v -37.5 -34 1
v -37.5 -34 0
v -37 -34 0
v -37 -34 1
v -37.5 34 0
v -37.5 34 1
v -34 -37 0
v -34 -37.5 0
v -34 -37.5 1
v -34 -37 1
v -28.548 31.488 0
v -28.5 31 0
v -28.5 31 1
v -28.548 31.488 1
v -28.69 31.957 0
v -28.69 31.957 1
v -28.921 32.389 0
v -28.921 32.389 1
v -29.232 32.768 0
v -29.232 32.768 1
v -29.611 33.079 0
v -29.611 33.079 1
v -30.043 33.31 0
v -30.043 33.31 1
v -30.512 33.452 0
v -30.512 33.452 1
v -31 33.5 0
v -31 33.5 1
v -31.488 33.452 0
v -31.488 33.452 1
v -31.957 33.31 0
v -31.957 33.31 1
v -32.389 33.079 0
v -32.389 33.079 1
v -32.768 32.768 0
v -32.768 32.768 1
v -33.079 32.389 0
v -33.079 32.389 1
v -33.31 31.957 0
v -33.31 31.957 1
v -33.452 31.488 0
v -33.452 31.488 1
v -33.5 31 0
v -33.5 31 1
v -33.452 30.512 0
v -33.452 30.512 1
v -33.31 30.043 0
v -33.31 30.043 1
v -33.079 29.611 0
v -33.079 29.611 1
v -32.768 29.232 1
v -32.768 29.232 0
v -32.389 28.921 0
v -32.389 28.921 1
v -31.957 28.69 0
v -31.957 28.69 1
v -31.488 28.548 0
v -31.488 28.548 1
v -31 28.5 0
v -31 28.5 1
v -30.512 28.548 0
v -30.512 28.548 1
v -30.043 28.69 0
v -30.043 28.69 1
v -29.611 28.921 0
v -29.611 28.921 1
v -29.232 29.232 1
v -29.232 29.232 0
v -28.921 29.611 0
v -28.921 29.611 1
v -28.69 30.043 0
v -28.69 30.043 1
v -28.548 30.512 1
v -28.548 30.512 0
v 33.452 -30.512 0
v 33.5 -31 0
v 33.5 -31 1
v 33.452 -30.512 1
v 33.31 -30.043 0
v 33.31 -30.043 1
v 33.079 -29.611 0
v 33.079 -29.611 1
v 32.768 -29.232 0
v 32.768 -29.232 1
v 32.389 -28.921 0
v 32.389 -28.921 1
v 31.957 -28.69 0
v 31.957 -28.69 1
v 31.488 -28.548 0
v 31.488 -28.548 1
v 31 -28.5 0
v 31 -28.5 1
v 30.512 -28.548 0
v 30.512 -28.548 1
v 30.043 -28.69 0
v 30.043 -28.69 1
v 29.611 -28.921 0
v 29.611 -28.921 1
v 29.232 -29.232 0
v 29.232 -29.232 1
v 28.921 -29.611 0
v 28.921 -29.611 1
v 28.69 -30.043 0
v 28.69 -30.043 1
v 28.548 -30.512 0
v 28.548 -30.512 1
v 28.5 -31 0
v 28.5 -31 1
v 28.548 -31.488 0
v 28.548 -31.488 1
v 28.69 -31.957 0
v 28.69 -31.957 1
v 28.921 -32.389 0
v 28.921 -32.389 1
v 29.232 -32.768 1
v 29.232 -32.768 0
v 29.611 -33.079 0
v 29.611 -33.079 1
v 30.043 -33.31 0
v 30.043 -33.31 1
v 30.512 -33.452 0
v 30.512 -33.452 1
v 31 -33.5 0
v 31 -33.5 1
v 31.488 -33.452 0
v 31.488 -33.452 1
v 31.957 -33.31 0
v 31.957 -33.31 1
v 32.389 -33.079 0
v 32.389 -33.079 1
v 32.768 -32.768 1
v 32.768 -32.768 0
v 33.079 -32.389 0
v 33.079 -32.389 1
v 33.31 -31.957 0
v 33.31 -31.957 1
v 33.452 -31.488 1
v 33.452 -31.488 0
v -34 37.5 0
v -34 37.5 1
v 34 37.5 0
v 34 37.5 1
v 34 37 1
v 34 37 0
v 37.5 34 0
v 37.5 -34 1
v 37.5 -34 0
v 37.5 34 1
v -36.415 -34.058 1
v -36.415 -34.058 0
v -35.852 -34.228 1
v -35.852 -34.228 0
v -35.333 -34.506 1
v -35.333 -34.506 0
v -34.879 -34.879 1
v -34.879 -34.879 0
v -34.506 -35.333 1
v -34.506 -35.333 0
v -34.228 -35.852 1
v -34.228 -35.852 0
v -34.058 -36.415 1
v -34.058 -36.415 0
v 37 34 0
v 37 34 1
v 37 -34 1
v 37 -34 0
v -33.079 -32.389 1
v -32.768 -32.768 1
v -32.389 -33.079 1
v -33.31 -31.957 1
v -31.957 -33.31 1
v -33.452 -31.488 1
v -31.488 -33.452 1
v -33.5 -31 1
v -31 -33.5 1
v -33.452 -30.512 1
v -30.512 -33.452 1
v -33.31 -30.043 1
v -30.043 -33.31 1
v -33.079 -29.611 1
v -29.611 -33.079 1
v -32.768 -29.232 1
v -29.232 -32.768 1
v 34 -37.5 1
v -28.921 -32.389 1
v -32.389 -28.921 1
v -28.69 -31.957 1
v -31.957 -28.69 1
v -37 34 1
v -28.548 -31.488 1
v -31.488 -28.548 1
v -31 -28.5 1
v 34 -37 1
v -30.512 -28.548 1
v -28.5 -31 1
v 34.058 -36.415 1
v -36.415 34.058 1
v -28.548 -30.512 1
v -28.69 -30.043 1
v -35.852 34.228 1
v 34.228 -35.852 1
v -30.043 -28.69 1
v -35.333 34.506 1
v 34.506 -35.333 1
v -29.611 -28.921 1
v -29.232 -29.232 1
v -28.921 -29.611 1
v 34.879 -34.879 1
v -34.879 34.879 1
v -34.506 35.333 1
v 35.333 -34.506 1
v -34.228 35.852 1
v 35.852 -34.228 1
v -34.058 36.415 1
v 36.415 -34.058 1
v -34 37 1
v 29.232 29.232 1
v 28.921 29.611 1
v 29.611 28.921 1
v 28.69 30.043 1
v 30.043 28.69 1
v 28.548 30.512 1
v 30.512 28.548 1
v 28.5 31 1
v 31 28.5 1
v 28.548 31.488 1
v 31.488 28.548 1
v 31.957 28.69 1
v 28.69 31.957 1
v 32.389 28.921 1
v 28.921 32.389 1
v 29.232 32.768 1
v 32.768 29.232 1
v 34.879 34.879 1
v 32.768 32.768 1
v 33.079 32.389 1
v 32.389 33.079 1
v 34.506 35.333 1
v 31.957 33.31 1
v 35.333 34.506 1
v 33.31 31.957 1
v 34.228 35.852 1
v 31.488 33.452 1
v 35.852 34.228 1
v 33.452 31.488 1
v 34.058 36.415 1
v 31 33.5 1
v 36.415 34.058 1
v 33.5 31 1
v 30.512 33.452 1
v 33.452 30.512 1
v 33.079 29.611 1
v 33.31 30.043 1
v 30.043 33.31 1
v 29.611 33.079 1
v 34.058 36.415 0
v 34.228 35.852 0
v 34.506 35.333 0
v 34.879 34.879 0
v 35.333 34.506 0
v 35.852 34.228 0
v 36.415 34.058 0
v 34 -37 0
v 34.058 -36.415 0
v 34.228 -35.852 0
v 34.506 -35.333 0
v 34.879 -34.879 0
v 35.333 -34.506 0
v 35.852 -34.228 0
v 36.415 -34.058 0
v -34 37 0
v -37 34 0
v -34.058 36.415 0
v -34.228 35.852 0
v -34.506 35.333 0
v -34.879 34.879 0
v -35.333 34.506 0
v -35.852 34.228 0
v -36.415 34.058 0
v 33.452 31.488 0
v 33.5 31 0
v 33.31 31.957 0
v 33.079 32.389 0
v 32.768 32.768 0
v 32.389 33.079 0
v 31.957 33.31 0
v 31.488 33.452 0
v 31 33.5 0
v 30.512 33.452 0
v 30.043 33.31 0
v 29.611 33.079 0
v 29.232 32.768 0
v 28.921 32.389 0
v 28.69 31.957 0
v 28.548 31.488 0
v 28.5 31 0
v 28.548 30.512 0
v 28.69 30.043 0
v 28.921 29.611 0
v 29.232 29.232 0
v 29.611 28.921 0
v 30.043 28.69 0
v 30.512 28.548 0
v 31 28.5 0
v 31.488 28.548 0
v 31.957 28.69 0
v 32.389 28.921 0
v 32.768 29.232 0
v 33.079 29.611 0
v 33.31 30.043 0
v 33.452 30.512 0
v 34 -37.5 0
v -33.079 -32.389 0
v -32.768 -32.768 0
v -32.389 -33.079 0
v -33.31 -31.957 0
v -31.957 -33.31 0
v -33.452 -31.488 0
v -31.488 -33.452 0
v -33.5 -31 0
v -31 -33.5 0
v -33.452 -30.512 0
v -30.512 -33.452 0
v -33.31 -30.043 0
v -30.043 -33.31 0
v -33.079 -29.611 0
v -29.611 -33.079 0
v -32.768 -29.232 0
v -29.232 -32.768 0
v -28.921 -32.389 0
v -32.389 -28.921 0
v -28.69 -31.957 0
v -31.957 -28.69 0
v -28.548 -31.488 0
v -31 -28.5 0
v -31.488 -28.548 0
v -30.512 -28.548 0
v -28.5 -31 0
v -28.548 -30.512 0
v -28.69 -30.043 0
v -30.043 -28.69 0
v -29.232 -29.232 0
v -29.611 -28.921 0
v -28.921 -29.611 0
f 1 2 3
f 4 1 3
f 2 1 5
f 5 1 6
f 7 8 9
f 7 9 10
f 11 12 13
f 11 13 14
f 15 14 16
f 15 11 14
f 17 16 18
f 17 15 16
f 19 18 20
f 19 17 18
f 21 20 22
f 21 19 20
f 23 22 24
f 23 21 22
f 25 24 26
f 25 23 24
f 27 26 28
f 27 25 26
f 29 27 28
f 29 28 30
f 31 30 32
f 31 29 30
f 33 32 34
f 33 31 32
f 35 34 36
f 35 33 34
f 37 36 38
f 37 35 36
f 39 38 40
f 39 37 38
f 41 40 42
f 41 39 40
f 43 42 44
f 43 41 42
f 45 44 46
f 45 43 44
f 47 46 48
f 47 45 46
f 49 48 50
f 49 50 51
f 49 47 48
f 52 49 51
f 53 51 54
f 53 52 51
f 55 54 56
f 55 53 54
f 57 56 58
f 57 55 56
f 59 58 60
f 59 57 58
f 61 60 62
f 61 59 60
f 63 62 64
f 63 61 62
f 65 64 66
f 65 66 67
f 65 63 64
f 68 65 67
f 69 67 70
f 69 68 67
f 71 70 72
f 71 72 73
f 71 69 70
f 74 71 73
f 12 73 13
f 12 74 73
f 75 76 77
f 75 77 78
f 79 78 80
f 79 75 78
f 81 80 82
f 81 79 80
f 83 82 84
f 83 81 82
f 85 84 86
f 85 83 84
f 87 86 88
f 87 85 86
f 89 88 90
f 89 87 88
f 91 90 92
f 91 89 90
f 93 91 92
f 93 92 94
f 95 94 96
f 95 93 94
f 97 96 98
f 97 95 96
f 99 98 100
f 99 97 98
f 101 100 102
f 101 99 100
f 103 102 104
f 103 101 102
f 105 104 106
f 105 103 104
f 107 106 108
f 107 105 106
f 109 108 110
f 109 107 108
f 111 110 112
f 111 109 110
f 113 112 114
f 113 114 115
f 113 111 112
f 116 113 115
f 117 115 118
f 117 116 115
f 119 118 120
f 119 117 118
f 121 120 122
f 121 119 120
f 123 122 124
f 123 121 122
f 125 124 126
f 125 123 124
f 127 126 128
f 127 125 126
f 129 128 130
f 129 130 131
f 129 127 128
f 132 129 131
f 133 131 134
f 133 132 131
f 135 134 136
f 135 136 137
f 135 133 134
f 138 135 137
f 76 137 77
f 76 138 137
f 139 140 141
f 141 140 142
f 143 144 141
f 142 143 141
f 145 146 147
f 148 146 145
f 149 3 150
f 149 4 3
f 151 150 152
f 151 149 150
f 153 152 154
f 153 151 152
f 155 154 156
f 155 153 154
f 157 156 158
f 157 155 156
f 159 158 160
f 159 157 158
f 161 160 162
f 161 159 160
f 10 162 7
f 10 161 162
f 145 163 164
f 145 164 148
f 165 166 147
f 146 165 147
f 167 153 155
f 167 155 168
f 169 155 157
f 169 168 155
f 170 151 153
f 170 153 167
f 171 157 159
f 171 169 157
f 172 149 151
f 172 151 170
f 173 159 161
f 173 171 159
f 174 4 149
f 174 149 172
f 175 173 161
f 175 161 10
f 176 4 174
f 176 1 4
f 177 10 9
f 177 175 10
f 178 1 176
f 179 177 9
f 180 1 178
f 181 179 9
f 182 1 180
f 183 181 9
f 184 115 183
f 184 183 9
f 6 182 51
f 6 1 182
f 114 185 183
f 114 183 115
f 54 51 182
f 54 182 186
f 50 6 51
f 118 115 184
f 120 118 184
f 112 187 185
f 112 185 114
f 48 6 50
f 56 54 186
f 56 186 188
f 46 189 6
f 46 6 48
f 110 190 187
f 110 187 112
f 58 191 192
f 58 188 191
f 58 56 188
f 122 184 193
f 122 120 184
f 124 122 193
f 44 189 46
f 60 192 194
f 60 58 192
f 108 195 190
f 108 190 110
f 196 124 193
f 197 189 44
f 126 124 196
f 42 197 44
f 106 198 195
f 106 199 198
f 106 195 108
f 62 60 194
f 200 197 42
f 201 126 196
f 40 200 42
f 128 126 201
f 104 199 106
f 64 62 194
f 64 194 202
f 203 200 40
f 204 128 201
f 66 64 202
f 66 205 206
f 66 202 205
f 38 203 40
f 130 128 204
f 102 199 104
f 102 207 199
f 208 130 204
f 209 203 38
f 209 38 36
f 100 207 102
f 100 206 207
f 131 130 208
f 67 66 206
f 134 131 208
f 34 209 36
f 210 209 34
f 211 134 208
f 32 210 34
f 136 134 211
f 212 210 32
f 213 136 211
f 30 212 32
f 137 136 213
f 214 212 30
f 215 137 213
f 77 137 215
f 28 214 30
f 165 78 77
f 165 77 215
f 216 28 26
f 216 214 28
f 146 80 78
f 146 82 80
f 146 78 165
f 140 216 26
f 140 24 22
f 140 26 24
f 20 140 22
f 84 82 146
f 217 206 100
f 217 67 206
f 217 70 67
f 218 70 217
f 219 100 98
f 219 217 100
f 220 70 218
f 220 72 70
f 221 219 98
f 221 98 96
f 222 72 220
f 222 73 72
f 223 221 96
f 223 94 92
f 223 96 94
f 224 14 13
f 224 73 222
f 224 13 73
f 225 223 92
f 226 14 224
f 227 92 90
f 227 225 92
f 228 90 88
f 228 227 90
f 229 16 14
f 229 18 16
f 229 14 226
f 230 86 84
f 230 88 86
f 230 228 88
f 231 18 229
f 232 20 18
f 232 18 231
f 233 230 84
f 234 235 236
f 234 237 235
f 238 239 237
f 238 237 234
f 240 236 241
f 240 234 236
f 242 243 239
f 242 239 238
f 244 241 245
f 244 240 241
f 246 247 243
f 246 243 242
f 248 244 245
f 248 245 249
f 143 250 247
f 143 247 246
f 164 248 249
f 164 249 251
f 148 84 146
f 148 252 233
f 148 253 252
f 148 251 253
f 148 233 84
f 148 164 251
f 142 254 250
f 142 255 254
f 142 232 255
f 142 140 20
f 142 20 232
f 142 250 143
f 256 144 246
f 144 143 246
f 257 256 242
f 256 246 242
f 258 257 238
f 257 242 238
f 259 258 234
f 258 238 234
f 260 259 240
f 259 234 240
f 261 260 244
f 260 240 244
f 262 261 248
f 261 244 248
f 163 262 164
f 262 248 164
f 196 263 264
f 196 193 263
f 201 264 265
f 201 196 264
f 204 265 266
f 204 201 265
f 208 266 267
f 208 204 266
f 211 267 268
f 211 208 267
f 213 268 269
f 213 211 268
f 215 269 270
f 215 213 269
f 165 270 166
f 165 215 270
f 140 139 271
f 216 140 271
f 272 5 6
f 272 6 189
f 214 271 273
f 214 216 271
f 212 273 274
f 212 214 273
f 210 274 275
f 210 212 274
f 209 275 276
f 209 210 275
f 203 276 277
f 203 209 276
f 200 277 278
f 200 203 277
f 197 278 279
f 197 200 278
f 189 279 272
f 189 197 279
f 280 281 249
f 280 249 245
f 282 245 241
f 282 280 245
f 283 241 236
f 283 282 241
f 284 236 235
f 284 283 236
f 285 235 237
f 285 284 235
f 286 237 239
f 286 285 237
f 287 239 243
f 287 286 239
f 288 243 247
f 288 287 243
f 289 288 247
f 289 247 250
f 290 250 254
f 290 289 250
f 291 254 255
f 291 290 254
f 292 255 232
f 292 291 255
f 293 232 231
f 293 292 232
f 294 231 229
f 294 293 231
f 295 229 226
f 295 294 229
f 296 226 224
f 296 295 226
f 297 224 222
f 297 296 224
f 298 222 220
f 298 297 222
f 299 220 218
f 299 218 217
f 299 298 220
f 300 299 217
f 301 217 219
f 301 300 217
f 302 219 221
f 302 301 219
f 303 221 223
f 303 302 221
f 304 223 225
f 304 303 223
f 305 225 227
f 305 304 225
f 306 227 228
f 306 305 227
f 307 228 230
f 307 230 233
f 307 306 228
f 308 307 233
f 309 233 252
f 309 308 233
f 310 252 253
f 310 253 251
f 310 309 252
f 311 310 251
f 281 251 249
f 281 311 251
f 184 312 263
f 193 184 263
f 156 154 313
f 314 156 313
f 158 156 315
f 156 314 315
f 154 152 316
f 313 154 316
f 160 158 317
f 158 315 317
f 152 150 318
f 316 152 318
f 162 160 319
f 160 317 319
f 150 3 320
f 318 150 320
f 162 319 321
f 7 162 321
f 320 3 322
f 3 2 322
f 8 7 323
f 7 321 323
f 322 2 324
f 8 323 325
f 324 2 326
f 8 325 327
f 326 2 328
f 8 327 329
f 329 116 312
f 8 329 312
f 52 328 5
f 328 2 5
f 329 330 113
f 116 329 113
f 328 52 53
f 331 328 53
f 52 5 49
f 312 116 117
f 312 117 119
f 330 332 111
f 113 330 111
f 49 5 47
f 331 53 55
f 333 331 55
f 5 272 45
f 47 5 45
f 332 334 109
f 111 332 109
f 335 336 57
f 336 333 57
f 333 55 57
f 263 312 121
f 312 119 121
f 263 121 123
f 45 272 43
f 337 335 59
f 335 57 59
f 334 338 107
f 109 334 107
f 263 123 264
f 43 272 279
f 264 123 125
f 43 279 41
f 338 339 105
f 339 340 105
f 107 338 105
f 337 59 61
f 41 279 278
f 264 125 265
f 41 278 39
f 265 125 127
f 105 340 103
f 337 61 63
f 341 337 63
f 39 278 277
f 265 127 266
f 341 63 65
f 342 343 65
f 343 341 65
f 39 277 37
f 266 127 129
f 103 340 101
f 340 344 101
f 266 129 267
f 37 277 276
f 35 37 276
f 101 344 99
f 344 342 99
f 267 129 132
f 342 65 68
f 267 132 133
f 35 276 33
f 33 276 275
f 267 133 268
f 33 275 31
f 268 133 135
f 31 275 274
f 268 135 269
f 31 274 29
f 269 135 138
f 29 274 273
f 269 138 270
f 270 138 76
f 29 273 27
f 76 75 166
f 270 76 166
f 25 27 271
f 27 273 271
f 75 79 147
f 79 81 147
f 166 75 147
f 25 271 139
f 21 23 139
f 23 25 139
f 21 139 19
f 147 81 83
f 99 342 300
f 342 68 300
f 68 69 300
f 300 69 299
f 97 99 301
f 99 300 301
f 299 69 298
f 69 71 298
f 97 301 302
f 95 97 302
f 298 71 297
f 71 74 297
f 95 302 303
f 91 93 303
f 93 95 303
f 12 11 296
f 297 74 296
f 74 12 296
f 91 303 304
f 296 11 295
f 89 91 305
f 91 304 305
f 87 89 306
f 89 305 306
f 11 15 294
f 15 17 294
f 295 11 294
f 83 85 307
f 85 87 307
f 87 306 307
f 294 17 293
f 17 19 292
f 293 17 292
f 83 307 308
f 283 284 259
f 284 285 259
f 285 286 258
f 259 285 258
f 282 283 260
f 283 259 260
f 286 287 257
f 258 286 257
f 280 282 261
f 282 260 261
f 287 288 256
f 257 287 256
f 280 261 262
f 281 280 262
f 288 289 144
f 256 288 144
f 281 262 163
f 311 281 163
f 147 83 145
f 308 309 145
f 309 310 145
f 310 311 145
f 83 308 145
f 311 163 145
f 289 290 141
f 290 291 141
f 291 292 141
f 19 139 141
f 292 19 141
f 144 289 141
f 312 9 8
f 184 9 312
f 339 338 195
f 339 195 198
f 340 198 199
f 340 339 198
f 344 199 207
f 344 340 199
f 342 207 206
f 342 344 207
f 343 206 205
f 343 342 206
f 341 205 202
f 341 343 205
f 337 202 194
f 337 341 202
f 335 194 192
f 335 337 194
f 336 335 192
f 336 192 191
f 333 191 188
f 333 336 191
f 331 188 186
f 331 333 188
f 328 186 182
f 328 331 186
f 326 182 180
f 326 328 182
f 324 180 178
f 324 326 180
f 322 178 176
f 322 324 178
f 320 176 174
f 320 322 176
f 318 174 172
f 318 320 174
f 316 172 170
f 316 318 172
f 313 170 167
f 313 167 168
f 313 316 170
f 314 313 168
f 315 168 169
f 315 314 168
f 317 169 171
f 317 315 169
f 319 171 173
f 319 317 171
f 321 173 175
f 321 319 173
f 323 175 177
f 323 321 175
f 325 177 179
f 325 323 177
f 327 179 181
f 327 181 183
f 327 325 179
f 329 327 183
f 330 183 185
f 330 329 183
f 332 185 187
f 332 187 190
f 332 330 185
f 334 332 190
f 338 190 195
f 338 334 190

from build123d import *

# Parameters (mm, degrees)
SKETCH_1_W          = 68
SKETCH_1_H          = 68
SKETCH_1_R          = 2.5
SKETCH_1_H_2        = 11
SKETCH_1_W_2        = 11
EXTRUDE_2_DEPTH     = 1
FILLET_1_R          = 3
SKETCH_2_W          = 7.5
SKETCH_2_H          = 68
SKETCH_2_W_2        = 68
SKETCH_2_H_2        = 7.5
CUT_EXTRUDE_1_DEPTH = 2


with BuildPart() as part:
    # ｽｹｯﾁ1 → ﾎﾞｽ - 押し出し2 (new body)
    with BuildSketch(Plane.XY):
        Rectangle(SKETCH_1_W, SKETCH_1_H)
        with Locations((-31, -31)):
            Circle(SKETCH_1_R, mode=Mode.SUBTRACT)
        with Locations((31, -31)):
            Circle(SKETCH_1_R, mode=Mode.SUBTRACT)
        with Locations((-31, 31)):
            Circle(SKETCH_1_R, mode=Mode.SUBTRACT)
        with Locations((31, 31)):
            Circle(SKETCH_1_R, mode=Mode.SUBTRACT)
        with Locations((0, 39.5)):
            Rectangle(SKETCH_1_W, SKETCH_1_H_2)
        with Locations((-39.5, 0)):
            Rectangle(SKETCH_1_W_2, SKETCH_1_H)
        with Locations((39.5, 0)):
            Rectangle(SKETCH_1_W_2, SKETCH_1_H)
        with Locations((0, -39.5)):
            Rectangle(SKETCH_1_W, SKETCH_1_H_2)
    extrude(amount=EXTRUDE_2_DEPTH)

    # ﾌｨﾚｯﾄ1
    fillet_1_edges = [part.edges().sort_by_distance(p)[0] for p in [
        (-34, -34, 0.5),
        (-34, 34, 0.5),
        (34, 34, 0.5),
        (34, -34, 0.5),
    ]]
    fillet(fillet_1_edges, radius=FILLET_1_R)

    # ｽｹｯﾁ2 → ｶｯﾄ - 押し出し1 (cut, through all)
    with BuildSketch(Plane.XY.offset(1)):
        with Locations((-41.25, 0)):
            Rectangle(SKETCH_2_W, SKETCH_2_H)
        with Locations((0, 41.25)):
            Rectangle(SKETCH_2_W_2, SKETCH_2_H_2)
        with Locations((41.25, 0)):
            Rectangle(SKETCH_2_W, SKETCH_2_H)
        with Locations((0, -41.25)):
            Rectangle(SKETCH_2_W_2, SKETCH_2_H_2)
    extrude(amount=-CUT_EXTRUDE_1_DEPTH, mode=Mode.SUBTRACT)


solid = part.part
